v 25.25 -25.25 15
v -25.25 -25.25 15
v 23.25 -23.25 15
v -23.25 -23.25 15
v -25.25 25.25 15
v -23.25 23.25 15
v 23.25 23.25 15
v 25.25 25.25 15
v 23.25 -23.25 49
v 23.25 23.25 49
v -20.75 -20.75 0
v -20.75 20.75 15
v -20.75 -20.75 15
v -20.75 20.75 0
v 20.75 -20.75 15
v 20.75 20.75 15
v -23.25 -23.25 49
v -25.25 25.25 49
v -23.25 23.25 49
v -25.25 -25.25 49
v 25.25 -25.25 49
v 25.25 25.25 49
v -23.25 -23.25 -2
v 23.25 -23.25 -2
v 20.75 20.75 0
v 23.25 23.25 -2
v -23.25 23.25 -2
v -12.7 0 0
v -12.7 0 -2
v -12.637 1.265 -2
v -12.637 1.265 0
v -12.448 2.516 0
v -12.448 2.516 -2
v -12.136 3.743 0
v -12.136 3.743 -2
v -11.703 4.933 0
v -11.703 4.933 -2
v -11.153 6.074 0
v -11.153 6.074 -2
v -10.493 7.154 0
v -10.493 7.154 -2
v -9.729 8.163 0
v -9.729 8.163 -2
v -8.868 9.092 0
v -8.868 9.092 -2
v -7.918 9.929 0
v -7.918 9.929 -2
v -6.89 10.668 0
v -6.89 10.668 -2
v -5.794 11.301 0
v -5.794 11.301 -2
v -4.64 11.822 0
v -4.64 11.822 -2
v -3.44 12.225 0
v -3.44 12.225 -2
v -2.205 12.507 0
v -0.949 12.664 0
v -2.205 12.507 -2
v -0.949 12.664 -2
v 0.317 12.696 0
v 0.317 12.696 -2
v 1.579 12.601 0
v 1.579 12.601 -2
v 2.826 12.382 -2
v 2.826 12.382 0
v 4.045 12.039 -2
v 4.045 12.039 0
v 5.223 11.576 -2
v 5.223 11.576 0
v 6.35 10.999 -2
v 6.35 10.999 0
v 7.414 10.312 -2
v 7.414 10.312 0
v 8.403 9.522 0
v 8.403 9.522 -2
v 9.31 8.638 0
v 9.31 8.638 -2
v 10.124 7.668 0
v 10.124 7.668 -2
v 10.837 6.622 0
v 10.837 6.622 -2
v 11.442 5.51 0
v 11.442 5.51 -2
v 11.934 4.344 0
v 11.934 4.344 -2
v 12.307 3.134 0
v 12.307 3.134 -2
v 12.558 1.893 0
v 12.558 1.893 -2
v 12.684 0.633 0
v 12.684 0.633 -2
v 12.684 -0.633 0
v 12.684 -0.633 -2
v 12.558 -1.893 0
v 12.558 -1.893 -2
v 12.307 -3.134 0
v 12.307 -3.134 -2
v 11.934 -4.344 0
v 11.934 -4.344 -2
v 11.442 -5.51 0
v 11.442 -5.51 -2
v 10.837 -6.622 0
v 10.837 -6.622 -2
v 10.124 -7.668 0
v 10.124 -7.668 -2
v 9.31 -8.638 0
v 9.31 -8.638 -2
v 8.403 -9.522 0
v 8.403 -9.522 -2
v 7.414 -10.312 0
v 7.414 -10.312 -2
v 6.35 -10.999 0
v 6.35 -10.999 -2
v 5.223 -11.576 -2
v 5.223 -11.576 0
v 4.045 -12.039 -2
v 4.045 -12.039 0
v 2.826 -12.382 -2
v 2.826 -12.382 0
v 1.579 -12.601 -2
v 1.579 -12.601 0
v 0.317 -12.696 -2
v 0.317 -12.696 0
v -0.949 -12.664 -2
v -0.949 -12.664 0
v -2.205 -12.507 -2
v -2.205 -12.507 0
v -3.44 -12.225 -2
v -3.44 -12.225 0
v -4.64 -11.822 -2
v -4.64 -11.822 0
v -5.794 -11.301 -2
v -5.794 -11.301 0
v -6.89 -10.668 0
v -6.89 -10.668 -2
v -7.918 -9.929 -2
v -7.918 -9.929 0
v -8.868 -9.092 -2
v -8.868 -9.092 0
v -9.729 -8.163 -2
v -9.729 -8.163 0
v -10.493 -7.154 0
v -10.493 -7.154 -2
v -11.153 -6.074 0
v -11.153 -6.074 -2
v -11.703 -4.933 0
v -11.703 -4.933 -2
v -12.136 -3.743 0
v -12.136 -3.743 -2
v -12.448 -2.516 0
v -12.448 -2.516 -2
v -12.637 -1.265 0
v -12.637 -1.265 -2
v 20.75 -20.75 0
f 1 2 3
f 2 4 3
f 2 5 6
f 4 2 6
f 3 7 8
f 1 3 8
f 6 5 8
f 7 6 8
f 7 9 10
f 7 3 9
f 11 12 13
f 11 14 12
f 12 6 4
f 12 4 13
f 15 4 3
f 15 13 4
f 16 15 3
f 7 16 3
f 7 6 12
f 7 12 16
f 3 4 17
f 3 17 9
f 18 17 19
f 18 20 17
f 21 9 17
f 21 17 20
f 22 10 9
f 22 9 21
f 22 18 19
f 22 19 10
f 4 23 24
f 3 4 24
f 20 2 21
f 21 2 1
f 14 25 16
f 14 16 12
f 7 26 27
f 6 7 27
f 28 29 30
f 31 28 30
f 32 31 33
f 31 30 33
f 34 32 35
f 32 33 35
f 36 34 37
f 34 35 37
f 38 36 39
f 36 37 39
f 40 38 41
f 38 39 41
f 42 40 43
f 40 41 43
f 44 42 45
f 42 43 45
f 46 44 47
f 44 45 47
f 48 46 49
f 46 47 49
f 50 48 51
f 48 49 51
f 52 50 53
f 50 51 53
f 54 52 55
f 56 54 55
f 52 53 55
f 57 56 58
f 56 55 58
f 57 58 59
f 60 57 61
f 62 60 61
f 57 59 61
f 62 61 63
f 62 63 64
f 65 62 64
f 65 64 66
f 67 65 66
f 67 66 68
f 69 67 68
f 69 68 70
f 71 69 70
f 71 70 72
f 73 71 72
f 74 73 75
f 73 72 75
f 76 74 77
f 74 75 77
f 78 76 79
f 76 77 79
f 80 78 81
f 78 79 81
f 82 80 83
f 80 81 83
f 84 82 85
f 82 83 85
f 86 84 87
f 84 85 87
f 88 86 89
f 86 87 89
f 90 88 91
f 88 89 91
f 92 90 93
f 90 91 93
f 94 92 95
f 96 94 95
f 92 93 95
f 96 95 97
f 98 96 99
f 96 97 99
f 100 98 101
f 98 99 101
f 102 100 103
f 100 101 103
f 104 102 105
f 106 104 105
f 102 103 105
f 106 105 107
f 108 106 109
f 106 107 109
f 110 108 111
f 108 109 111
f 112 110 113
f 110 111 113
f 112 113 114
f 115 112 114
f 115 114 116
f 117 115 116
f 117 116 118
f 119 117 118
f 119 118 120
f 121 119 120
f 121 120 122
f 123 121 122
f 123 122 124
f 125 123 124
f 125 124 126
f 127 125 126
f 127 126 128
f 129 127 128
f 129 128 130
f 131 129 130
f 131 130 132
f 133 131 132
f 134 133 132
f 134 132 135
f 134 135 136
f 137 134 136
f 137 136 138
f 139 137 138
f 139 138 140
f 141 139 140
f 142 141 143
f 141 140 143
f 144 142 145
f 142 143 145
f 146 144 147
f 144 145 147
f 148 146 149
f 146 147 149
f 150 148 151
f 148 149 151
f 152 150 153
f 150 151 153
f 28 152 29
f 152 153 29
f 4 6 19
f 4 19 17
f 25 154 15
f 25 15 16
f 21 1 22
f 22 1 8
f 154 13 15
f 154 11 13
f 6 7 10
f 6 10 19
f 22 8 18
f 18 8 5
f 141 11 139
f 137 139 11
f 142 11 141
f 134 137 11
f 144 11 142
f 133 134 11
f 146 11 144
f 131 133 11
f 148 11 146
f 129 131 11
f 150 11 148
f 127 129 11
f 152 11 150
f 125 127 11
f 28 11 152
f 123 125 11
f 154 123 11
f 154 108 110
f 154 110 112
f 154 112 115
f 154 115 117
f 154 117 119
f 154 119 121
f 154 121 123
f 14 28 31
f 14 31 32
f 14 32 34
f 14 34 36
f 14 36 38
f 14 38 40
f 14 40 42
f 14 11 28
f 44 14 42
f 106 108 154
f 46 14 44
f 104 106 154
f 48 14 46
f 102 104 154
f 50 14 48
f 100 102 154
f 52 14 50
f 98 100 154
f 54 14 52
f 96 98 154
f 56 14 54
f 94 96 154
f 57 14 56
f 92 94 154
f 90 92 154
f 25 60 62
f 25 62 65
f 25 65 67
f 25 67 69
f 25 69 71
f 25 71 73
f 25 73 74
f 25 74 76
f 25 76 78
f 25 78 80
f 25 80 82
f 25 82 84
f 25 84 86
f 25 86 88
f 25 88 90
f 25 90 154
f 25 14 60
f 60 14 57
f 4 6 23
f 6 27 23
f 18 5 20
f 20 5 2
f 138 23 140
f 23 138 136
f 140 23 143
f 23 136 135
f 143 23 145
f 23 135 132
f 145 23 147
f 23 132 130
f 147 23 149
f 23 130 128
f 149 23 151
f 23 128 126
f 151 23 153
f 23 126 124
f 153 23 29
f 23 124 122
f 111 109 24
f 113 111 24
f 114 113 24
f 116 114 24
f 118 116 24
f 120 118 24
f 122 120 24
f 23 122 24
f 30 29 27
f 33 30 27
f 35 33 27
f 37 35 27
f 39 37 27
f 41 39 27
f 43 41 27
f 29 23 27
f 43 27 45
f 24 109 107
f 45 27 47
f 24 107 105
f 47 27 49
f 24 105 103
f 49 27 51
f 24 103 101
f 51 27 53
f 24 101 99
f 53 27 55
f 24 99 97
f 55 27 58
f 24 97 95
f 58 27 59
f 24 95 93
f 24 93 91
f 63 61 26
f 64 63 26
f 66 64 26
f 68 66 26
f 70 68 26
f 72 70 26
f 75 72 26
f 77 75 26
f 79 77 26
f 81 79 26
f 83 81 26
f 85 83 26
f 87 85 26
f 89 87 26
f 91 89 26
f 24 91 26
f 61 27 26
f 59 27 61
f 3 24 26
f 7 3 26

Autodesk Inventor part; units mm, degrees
ref_plane "YZ Plane" through (0, 0, 0) normal (1, 0, 0) x (0, 1, 0)
ref_plane "XZ Plane" through (0, 0, 0) normal (0, 1, 0) x (-1, 0, 0)
ref_plane "XY Plane" through (0, 0, 0) normal (0, 0, 1) x (1, 0, 0)
sketch "Sketch18" plane through (0, 0, 0) normal (0, 0, 1) x (1, 0, 0)
  line L0 (-23.25, -23.25) -> (23.25, -23.25)
  line L1 (23.25, -23.25) -> (23.25, 23.25)
  line L2 (23.25, 23.25) -> (-23.25, 23.25)
  line L3 (-23.25, 23.25) -> (-23.25, -23.25)
  line L4 (-23.25, -23.25) -> (23.25, 23.25) construction
  line L5 (23.25, -23.25) -> (-23.25, 23.25) construction
  line L6 (-20.75, -20.75) -> (20.75, -20.75)
  line L7 (20.75, -20.75) -> (20.75, 20.75)
  line L8 (20.75, 20.75) -> (-20.75, 20.75)
  line L9 (-20.75, 20.75) -> (-20.75, -20.75)
  line L10 (-20.75, -20.75) -> (20.75, 20.75) construction
  line L11 (20.75, -20.75) -> (-20.75, 20.75) construction
  circle A0 centre (0, 0) radius 2.6
  dimension "d102" = 46.5
  dimension "d103" = 46.5
  dimension "d104" = 2.5
  dimension "d105" = 2.5
  dimension "d106" = 5.2
extrude "Extrusion14" add sketch "Sketch18" against normal blind 2 contours L3 L2 L1 L0 | L9 L8 L7 L6 | A0
extrude "Extrusion15" add sketch "Sketch18" along normal blind 15 contours L3 L2 L1 L0
sketch "Sketch19" plane through (0, 0, 15) normal (0, 0, 1) x (1, 0, 0)
  line L0 (-20.75, -20.75) -> (20.75, -20.75)
  line L1 (20.75, -20.75) -> (20.75, 20.75)
  line L2 (20.75, 20.75) -> (-20.75, 20.75)
  line L3 (-20.75, 20.75) -> (-20.75, -20.75)
  line L4 (-20.75, -20.75) -> (20.75, 20.75) construction
  line L5 (20.75, -20.75) -> (-20.75, 20.75) construction
  line L6 (-25.25, -25.25) -> (25.25, -25.25)
  line L7 (25.25, -25.25) -> (25.25, 25.25)
  line L8 (25.25, 25.25) -> (-25.25, 25.25)
  line L9 (-25.25, 25.25) -> (-25.25, -25.25)
  line L10 (-25.25, -25.25) -> (25.25, 25.25) construction
  line L11 (25.25, -25.25) -> (-25.25, 25.25) construction
  line L12 (23.25, -23.25) -> (23.25, 23.25) projected
  line L13 (23.25, 23.25) -> (-23.25, 23.25) projected
  line L14 (-23.25, 23.25) -> (-23.25, -23.25) projected
  line L15 (-23.25, -23.25) -> (23.25, -23.25) projected
  point P0 (0, 0)
  dimension "d111" = 2
  dimension "d112" = 2
extrude "Extrusion16" add sketch "Sketch19" along normal blind 34 contours L9 L8 L7 L6
sketch "Sketch21" plane through (0, 0, -2) normal (0, 0, -1) x (-1, 0, 0)
  circle A0 centre (0, 0) radius 12.7
  dimension "d119" = 25.4
extrude "Extrusion17" cut sketch "Sketch21" against normal through all
equation "\"screwSpacing\" = 34"
equation "\"interiorWidth\" = 42"
equation "\"wallThickness\" = 2"
equation "\"holeDiameter\" = 3"
properties part number "IMX178 Camera Case Cap" material "PET Plastic"
